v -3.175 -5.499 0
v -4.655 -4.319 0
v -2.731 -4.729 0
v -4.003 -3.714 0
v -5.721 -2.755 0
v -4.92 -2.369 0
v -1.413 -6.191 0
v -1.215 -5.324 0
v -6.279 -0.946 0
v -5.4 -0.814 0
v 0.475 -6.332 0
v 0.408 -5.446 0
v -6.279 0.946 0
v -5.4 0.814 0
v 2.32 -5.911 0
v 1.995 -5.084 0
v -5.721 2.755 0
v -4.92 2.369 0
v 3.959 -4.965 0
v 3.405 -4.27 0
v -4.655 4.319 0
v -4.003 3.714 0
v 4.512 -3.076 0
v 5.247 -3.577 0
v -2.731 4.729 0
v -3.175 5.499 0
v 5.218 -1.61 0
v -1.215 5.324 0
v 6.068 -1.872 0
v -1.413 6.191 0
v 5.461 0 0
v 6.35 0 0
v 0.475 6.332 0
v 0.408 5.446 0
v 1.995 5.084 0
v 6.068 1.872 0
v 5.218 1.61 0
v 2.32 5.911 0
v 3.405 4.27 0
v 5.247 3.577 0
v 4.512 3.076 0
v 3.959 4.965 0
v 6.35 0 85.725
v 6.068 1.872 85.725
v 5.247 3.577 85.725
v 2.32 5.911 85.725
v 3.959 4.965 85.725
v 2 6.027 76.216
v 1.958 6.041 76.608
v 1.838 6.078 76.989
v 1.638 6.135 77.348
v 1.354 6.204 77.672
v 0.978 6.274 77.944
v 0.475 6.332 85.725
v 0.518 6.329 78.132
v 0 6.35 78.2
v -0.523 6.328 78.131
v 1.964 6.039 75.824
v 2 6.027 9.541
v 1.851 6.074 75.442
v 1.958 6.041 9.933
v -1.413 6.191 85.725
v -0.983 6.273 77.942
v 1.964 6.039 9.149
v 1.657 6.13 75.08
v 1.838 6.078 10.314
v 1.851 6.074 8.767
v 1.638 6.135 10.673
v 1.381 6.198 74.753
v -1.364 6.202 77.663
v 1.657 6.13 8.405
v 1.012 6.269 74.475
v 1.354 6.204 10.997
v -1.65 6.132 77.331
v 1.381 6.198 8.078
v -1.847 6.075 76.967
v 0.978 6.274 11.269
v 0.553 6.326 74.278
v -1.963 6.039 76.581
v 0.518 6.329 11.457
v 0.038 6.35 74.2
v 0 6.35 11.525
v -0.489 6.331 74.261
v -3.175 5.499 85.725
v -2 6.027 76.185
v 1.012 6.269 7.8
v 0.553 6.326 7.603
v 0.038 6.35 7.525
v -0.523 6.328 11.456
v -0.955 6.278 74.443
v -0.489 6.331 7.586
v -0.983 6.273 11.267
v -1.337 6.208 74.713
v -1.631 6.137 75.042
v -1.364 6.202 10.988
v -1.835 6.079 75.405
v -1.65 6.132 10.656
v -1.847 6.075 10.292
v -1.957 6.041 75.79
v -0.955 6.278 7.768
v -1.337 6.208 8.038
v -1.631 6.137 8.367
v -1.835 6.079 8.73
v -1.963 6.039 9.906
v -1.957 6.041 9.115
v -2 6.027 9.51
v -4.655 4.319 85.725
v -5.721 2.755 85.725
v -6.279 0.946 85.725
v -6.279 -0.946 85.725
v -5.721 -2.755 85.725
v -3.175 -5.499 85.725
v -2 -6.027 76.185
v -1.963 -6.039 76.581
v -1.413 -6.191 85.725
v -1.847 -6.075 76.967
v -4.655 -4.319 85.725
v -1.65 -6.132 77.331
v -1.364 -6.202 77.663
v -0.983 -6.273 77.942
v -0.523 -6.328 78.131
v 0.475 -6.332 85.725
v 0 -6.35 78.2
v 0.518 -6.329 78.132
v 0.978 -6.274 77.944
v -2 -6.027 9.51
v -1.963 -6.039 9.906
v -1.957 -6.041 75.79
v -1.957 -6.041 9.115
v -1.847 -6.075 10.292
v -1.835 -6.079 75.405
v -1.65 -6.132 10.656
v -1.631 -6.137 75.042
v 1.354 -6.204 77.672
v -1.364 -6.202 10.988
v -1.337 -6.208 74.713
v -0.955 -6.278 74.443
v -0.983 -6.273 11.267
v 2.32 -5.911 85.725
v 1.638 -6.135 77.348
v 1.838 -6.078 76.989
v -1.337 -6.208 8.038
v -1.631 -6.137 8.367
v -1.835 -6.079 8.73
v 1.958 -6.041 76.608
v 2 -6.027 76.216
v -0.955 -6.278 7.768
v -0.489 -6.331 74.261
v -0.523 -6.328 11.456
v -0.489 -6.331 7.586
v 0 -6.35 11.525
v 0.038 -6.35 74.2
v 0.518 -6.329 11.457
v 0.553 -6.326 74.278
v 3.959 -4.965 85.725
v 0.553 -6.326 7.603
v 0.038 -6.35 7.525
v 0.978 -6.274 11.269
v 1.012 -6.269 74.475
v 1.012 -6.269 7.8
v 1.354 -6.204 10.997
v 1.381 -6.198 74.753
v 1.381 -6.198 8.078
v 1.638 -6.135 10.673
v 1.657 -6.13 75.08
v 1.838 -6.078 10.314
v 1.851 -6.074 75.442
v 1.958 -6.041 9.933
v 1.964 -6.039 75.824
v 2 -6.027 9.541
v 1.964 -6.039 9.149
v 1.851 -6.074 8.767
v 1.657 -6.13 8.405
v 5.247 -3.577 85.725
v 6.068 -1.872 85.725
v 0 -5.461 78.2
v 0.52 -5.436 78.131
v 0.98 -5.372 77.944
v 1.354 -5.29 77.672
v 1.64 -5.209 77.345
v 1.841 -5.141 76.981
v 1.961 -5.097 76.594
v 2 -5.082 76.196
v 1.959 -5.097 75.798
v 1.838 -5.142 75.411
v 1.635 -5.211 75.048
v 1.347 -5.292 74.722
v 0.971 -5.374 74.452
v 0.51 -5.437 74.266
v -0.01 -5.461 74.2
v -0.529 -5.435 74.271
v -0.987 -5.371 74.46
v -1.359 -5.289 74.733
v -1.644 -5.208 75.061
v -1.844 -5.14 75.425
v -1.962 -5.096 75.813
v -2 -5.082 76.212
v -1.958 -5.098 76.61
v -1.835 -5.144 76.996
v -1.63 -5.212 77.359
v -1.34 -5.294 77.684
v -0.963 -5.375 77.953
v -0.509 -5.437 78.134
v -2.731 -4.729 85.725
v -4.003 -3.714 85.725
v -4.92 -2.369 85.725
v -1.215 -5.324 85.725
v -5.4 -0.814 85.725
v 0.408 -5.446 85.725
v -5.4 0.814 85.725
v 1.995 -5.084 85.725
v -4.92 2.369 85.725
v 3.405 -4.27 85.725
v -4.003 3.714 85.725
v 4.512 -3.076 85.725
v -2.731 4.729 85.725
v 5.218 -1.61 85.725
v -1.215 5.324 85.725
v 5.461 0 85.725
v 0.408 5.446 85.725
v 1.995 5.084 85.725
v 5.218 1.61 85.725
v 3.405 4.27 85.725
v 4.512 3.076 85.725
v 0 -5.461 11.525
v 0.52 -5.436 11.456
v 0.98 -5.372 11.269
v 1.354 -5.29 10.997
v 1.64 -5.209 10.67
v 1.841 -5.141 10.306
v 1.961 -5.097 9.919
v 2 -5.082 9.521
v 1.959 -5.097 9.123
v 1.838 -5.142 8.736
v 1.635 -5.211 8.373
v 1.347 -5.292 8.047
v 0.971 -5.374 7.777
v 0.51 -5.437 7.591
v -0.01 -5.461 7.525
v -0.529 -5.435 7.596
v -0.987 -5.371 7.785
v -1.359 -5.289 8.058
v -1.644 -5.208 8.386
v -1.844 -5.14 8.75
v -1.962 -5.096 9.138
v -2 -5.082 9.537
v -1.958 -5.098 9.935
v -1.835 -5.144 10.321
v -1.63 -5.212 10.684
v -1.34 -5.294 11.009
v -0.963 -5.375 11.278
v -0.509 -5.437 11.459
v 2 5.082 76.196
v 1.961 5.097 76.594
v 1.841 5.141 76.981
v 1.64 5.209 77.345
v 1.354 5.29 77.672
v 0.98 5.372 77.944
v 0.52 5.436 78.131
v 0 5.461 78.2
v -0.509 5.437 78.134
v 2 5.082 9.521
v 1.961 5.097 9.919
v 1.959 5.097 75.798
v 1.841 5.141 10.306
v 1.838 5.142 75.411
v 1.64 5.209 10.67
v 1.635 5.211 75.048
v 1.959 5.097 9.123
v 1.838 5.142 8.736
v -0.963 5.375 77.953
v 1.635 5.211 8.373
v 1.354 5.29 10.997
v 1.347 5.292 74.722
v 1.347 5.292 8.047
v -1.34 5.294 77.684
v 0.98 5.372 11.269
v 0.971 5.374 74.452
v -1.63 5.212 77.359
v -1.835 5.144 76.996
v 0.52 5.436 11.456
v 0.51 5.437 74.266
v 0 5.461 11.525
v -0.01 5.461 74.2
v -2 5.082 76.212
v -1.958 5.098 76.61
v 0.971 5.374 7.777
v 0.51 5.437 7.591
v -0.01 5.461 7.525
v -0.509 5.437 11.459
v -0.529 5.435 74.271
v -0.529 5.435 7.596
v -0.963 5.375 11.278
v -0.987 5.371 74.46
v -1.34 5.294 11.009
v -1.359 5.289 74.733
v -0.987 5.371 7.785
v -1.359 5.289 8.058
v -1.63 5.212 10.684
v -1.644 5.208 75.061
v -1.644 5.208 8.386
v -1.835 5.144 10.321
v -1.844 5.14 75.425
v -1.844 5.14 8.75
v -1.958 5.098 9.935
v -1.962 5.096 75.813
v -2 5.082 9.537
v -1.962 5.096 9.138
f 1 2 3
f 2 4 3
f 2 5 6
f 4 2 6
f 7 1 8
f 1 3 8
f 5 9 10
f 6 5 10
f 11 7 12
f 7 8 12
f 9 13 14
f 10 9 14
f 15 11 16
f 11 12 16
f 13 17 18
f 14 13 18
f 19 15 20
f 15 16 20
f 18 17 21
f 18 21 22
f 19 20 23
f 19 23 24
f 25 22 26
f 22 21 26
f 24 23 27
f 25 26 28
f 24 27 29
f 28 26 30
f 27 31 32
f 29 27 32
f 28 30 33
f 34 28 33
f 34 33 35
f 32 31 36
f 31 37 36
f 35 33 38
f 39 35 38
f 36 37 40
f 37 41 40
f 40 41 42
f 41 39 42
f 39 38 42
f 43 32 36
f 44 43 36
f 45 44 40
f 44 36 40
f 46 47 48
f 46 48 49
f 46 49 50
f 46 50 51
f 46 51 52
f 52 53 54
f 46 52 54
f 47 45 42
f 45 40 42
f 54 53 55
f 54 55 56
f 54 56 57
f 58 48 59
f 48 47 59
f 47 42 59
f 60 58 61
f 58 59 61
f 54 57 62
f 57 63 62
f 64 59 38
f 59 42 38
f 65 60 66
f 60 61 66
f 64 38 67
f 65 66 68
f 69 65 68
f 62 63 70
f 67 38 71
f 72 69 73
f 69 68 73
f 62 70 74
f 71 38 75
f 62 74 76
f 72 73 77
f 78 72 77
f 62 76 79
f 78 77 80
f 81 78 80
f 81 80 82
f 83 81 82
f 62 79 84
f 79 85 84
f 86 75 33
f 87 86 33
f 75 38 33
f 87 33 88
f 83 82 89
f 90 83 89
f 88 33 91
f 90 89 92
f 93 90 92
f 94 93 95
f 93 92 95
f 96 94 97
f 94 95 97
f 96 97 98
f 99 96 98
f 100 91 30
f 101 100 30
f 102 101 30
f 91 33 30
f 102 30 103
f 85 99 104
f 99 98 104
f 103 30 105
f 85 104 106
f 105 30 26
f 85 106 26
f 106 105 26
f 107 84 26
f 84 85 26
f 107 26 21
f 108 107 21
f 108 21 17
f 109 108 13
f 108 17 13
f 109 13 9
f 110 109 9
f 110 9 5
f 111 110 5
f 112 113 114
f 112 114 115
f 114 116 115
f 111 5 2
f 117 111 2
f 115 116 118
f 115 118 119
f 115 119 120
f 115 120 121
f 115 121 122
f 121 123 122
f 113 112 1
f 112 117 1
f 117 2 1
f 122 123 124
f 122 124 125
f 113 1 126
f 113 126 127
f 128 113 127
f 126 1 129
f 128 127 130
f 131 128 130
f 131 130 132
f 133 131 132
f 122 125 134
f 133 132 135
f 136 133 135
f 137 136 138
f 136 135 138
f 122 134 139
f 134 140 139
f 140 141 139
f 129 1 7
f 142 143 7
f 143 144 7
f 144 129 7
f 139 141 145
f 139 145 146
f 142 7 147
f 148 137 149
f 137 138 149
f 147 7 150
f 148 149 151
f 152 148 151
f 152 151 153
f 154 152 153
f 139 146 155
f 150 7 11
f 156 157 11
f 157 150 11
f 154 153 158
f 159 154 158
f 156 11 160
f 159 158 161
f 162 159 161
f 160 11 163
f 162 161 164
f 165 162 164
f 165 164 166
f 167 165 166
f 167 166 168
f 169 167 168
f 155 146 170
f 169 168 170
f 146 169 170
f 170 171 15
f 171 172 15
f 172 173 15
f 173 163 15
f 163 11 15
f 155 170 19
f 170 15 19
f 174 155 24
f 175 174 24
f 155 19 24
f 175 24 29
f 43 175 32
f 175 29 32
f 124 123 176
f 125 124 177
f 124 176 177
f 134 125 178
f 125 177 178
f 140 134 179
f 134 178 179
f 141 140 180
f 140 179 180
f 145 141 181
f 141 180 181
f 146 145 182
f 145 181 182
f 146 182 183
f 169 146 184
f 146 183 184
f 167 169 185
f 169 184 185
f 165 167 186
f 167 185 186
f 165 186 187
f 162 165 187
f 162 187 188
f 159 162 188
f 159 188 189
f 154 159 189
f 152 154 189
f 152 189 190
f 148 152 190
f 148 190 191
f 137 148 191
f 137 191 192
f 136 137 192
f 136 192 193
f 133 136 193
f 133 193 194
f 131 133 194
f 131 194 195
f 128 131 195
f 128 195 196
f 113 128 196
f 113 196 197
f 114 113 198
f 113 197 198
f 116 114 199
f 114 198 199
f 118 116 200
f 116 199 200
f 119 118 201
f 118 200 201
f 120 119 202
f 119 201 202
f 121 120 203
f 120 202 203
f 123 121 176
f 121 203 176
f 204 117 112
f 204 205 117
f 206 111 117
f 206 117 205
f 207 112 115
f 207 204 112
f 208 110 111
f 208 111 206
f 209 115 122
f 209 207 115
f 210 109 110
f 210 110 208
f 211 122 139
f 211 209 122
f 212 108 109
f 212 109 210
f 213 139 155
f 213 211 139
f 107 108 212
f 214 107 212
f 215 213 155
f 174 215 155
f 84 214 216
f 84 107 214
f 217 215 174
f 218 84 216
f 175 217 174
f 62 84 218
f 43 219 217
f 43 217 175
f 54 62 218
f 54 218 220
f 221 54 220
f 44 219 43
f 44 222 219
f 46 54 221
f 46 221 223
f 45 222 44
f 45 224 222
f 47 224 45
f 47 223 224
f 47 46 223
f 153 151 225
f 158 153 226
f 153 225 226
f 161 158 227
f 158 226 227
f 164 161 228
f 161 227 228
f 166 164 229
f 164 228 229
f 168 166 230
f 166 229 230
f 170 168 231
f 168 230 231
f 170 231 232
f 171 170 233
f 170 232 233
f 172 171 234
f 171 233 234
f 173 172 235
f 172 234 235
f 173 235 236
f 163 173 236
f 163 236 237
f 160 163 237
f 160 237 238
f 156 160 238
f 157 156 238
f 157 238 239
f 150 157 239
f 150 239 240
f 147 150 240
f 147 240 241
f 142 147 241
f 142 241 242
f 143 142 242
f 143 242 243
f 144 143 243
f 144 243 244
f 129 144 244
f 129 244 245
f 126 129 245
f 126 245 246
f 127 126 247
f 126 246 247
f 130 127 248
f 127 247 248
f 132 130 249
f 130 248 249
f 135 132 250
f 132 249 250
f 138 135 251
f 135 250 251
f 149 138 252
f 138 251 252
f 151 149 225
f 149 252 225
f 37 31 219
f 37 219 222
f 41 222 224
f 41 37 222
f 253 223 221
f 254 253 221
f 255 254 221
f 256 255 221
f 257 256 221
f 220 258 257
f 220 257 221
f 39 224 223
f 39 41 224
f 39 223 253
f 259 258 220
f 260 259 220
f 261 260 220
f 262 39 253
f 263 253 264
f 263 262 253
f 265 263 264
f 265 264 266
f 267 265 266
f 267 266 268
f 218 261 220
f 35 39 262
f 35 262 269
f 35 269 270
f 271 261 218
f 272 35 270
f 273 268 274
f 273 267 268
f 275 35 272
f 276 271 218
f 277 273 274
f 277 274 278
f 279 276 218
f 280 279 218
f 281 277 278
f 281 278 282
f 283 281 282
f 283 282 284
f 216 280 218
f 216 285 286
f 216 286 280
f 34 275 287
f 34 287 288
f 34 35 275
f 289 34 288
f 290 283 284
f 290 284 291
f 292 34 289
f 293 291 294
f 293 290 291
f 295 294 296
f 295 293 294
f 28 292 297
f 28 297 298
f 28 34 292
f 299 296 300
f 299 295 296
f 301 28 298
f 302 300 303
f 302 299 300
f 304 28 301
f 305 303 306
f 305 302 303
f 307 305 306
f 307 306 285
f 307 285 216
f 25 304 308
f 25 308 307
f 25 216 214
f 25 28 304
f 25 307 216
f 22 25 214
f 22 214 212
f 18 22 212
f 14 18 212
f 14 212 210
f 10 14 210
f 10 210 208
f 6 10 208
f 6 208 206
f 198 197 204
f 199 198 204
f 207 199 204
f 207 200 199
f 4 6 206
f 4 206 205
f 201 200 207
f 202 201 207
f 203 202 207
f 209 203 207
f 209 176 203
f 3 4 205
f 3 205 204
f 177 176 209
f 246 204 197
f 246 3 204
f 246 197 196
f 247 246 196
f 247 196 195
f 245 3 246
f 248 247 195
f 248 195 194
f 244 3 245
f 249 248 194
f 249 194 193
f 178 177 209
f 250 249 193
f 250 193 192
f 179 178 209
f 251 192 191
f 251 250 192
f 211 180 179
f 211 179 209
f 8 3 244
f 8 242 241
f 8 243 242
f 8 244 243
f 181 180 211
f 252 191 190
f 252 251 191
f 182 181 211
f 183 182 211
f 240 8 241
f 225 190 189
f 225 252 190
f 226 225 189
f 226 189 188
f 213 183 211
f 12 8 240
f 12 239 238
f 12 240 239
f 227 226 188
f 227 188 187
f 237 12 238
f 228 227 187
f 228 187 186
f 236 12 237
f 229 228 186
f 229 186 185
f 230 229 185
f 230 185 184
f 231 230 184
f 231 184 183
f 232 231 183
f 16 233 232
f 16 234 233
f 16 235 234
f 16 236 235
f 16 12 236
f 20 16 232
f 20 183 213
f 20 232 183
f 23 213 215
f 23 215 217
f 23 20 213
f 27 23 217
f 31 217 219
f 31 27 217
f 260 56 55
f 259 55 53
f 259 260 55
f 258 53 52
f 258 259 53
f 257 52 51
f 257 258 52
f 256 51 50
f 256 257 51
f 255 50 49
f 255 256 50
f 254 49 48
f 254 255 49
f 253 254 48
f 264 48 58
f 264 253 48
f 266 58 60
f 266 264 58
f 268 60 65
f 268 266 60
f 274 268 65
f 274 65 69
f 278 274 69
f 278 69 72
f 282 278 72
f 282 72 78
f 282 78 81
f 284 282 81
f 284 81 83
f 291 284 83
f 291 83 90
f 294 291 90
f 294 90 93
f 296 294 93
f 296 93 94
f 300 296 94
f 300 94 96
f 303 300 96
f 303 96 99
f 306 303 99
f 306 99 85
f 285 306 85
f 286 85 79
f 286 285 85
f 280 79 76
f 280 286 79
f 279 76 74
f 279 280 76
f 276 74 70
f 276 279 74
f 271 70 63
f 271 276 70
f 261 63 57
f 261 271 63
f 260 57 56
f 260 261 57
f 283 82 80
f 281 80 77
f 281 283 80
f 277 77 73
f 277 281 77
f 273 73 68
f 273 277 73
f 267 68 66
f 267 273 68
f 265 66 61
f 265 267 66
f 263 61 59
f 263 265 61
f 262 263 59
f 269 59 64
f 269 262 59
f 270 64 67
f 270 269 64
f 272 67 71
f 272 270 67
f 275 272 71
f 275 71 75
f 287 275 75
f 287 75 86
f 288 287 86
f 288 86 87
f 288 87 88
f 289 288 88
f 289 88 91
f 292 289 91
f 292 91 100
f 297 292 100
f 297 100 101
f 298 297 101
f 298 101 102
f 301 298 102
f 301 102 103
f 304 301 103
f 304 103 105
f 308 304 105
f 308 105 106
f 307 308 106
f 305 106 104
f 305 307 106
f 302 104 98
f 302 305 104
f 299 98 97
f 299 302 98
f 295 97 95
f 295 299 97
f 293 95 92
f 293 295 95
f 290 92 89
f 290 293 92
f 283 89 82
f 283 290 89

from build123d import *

# Parameters (mm, degrees)
SKETCH1_R               = 6.35
SKETCH1_R_2             = 5.461
EXTRUDE1_DEPTH          = 85.725
SKETCH2_R               = 2
CUT_EXTRUDE1_DEPTH      = 38.1
CUT_EXTRUDE1_DEPTH_BACK = 38.1


with BuildPart() as part:
    # Sketch1 → Extrude1 (new body)
    with BuildSketch(Plane.XY):
        Circle(SKETCH1_R)
        Circle(SKETCH1_R_2, mode=Mode.SUBTRACT)
    extrude(amount=EXTRUDE1_DEPTH)

    # Sketch2 → Cut-Extrude1 (cut, two sides)
    with BuildSketch(Plane(origin=(0, 0, 0), x_dir=(1, 0, 0), z_dir=(0, 1, 0))) as cut_extrude1_sk:
        with Locations(Location((0, -9.525, 0), (0, 0, 270))):  # turned: the seam where the file's is
            Circle(SKETCH2_R)
        with Locations(Location((0, -76.2, 0), (0, 0, 270))):  # turned: the seam where the file's is
            Circle(SKETCH2_R)
    extrude(amount=CUT_EXTRUDE1_DEPTH, mode=Mode.SUBTRACT)
    extrude(cut_extrude1_sk.sketch, amount=-CUT_EXTRUDE1_DEPTH_BACK, mode=Mode.SUBTRACT)


solid = part.part
